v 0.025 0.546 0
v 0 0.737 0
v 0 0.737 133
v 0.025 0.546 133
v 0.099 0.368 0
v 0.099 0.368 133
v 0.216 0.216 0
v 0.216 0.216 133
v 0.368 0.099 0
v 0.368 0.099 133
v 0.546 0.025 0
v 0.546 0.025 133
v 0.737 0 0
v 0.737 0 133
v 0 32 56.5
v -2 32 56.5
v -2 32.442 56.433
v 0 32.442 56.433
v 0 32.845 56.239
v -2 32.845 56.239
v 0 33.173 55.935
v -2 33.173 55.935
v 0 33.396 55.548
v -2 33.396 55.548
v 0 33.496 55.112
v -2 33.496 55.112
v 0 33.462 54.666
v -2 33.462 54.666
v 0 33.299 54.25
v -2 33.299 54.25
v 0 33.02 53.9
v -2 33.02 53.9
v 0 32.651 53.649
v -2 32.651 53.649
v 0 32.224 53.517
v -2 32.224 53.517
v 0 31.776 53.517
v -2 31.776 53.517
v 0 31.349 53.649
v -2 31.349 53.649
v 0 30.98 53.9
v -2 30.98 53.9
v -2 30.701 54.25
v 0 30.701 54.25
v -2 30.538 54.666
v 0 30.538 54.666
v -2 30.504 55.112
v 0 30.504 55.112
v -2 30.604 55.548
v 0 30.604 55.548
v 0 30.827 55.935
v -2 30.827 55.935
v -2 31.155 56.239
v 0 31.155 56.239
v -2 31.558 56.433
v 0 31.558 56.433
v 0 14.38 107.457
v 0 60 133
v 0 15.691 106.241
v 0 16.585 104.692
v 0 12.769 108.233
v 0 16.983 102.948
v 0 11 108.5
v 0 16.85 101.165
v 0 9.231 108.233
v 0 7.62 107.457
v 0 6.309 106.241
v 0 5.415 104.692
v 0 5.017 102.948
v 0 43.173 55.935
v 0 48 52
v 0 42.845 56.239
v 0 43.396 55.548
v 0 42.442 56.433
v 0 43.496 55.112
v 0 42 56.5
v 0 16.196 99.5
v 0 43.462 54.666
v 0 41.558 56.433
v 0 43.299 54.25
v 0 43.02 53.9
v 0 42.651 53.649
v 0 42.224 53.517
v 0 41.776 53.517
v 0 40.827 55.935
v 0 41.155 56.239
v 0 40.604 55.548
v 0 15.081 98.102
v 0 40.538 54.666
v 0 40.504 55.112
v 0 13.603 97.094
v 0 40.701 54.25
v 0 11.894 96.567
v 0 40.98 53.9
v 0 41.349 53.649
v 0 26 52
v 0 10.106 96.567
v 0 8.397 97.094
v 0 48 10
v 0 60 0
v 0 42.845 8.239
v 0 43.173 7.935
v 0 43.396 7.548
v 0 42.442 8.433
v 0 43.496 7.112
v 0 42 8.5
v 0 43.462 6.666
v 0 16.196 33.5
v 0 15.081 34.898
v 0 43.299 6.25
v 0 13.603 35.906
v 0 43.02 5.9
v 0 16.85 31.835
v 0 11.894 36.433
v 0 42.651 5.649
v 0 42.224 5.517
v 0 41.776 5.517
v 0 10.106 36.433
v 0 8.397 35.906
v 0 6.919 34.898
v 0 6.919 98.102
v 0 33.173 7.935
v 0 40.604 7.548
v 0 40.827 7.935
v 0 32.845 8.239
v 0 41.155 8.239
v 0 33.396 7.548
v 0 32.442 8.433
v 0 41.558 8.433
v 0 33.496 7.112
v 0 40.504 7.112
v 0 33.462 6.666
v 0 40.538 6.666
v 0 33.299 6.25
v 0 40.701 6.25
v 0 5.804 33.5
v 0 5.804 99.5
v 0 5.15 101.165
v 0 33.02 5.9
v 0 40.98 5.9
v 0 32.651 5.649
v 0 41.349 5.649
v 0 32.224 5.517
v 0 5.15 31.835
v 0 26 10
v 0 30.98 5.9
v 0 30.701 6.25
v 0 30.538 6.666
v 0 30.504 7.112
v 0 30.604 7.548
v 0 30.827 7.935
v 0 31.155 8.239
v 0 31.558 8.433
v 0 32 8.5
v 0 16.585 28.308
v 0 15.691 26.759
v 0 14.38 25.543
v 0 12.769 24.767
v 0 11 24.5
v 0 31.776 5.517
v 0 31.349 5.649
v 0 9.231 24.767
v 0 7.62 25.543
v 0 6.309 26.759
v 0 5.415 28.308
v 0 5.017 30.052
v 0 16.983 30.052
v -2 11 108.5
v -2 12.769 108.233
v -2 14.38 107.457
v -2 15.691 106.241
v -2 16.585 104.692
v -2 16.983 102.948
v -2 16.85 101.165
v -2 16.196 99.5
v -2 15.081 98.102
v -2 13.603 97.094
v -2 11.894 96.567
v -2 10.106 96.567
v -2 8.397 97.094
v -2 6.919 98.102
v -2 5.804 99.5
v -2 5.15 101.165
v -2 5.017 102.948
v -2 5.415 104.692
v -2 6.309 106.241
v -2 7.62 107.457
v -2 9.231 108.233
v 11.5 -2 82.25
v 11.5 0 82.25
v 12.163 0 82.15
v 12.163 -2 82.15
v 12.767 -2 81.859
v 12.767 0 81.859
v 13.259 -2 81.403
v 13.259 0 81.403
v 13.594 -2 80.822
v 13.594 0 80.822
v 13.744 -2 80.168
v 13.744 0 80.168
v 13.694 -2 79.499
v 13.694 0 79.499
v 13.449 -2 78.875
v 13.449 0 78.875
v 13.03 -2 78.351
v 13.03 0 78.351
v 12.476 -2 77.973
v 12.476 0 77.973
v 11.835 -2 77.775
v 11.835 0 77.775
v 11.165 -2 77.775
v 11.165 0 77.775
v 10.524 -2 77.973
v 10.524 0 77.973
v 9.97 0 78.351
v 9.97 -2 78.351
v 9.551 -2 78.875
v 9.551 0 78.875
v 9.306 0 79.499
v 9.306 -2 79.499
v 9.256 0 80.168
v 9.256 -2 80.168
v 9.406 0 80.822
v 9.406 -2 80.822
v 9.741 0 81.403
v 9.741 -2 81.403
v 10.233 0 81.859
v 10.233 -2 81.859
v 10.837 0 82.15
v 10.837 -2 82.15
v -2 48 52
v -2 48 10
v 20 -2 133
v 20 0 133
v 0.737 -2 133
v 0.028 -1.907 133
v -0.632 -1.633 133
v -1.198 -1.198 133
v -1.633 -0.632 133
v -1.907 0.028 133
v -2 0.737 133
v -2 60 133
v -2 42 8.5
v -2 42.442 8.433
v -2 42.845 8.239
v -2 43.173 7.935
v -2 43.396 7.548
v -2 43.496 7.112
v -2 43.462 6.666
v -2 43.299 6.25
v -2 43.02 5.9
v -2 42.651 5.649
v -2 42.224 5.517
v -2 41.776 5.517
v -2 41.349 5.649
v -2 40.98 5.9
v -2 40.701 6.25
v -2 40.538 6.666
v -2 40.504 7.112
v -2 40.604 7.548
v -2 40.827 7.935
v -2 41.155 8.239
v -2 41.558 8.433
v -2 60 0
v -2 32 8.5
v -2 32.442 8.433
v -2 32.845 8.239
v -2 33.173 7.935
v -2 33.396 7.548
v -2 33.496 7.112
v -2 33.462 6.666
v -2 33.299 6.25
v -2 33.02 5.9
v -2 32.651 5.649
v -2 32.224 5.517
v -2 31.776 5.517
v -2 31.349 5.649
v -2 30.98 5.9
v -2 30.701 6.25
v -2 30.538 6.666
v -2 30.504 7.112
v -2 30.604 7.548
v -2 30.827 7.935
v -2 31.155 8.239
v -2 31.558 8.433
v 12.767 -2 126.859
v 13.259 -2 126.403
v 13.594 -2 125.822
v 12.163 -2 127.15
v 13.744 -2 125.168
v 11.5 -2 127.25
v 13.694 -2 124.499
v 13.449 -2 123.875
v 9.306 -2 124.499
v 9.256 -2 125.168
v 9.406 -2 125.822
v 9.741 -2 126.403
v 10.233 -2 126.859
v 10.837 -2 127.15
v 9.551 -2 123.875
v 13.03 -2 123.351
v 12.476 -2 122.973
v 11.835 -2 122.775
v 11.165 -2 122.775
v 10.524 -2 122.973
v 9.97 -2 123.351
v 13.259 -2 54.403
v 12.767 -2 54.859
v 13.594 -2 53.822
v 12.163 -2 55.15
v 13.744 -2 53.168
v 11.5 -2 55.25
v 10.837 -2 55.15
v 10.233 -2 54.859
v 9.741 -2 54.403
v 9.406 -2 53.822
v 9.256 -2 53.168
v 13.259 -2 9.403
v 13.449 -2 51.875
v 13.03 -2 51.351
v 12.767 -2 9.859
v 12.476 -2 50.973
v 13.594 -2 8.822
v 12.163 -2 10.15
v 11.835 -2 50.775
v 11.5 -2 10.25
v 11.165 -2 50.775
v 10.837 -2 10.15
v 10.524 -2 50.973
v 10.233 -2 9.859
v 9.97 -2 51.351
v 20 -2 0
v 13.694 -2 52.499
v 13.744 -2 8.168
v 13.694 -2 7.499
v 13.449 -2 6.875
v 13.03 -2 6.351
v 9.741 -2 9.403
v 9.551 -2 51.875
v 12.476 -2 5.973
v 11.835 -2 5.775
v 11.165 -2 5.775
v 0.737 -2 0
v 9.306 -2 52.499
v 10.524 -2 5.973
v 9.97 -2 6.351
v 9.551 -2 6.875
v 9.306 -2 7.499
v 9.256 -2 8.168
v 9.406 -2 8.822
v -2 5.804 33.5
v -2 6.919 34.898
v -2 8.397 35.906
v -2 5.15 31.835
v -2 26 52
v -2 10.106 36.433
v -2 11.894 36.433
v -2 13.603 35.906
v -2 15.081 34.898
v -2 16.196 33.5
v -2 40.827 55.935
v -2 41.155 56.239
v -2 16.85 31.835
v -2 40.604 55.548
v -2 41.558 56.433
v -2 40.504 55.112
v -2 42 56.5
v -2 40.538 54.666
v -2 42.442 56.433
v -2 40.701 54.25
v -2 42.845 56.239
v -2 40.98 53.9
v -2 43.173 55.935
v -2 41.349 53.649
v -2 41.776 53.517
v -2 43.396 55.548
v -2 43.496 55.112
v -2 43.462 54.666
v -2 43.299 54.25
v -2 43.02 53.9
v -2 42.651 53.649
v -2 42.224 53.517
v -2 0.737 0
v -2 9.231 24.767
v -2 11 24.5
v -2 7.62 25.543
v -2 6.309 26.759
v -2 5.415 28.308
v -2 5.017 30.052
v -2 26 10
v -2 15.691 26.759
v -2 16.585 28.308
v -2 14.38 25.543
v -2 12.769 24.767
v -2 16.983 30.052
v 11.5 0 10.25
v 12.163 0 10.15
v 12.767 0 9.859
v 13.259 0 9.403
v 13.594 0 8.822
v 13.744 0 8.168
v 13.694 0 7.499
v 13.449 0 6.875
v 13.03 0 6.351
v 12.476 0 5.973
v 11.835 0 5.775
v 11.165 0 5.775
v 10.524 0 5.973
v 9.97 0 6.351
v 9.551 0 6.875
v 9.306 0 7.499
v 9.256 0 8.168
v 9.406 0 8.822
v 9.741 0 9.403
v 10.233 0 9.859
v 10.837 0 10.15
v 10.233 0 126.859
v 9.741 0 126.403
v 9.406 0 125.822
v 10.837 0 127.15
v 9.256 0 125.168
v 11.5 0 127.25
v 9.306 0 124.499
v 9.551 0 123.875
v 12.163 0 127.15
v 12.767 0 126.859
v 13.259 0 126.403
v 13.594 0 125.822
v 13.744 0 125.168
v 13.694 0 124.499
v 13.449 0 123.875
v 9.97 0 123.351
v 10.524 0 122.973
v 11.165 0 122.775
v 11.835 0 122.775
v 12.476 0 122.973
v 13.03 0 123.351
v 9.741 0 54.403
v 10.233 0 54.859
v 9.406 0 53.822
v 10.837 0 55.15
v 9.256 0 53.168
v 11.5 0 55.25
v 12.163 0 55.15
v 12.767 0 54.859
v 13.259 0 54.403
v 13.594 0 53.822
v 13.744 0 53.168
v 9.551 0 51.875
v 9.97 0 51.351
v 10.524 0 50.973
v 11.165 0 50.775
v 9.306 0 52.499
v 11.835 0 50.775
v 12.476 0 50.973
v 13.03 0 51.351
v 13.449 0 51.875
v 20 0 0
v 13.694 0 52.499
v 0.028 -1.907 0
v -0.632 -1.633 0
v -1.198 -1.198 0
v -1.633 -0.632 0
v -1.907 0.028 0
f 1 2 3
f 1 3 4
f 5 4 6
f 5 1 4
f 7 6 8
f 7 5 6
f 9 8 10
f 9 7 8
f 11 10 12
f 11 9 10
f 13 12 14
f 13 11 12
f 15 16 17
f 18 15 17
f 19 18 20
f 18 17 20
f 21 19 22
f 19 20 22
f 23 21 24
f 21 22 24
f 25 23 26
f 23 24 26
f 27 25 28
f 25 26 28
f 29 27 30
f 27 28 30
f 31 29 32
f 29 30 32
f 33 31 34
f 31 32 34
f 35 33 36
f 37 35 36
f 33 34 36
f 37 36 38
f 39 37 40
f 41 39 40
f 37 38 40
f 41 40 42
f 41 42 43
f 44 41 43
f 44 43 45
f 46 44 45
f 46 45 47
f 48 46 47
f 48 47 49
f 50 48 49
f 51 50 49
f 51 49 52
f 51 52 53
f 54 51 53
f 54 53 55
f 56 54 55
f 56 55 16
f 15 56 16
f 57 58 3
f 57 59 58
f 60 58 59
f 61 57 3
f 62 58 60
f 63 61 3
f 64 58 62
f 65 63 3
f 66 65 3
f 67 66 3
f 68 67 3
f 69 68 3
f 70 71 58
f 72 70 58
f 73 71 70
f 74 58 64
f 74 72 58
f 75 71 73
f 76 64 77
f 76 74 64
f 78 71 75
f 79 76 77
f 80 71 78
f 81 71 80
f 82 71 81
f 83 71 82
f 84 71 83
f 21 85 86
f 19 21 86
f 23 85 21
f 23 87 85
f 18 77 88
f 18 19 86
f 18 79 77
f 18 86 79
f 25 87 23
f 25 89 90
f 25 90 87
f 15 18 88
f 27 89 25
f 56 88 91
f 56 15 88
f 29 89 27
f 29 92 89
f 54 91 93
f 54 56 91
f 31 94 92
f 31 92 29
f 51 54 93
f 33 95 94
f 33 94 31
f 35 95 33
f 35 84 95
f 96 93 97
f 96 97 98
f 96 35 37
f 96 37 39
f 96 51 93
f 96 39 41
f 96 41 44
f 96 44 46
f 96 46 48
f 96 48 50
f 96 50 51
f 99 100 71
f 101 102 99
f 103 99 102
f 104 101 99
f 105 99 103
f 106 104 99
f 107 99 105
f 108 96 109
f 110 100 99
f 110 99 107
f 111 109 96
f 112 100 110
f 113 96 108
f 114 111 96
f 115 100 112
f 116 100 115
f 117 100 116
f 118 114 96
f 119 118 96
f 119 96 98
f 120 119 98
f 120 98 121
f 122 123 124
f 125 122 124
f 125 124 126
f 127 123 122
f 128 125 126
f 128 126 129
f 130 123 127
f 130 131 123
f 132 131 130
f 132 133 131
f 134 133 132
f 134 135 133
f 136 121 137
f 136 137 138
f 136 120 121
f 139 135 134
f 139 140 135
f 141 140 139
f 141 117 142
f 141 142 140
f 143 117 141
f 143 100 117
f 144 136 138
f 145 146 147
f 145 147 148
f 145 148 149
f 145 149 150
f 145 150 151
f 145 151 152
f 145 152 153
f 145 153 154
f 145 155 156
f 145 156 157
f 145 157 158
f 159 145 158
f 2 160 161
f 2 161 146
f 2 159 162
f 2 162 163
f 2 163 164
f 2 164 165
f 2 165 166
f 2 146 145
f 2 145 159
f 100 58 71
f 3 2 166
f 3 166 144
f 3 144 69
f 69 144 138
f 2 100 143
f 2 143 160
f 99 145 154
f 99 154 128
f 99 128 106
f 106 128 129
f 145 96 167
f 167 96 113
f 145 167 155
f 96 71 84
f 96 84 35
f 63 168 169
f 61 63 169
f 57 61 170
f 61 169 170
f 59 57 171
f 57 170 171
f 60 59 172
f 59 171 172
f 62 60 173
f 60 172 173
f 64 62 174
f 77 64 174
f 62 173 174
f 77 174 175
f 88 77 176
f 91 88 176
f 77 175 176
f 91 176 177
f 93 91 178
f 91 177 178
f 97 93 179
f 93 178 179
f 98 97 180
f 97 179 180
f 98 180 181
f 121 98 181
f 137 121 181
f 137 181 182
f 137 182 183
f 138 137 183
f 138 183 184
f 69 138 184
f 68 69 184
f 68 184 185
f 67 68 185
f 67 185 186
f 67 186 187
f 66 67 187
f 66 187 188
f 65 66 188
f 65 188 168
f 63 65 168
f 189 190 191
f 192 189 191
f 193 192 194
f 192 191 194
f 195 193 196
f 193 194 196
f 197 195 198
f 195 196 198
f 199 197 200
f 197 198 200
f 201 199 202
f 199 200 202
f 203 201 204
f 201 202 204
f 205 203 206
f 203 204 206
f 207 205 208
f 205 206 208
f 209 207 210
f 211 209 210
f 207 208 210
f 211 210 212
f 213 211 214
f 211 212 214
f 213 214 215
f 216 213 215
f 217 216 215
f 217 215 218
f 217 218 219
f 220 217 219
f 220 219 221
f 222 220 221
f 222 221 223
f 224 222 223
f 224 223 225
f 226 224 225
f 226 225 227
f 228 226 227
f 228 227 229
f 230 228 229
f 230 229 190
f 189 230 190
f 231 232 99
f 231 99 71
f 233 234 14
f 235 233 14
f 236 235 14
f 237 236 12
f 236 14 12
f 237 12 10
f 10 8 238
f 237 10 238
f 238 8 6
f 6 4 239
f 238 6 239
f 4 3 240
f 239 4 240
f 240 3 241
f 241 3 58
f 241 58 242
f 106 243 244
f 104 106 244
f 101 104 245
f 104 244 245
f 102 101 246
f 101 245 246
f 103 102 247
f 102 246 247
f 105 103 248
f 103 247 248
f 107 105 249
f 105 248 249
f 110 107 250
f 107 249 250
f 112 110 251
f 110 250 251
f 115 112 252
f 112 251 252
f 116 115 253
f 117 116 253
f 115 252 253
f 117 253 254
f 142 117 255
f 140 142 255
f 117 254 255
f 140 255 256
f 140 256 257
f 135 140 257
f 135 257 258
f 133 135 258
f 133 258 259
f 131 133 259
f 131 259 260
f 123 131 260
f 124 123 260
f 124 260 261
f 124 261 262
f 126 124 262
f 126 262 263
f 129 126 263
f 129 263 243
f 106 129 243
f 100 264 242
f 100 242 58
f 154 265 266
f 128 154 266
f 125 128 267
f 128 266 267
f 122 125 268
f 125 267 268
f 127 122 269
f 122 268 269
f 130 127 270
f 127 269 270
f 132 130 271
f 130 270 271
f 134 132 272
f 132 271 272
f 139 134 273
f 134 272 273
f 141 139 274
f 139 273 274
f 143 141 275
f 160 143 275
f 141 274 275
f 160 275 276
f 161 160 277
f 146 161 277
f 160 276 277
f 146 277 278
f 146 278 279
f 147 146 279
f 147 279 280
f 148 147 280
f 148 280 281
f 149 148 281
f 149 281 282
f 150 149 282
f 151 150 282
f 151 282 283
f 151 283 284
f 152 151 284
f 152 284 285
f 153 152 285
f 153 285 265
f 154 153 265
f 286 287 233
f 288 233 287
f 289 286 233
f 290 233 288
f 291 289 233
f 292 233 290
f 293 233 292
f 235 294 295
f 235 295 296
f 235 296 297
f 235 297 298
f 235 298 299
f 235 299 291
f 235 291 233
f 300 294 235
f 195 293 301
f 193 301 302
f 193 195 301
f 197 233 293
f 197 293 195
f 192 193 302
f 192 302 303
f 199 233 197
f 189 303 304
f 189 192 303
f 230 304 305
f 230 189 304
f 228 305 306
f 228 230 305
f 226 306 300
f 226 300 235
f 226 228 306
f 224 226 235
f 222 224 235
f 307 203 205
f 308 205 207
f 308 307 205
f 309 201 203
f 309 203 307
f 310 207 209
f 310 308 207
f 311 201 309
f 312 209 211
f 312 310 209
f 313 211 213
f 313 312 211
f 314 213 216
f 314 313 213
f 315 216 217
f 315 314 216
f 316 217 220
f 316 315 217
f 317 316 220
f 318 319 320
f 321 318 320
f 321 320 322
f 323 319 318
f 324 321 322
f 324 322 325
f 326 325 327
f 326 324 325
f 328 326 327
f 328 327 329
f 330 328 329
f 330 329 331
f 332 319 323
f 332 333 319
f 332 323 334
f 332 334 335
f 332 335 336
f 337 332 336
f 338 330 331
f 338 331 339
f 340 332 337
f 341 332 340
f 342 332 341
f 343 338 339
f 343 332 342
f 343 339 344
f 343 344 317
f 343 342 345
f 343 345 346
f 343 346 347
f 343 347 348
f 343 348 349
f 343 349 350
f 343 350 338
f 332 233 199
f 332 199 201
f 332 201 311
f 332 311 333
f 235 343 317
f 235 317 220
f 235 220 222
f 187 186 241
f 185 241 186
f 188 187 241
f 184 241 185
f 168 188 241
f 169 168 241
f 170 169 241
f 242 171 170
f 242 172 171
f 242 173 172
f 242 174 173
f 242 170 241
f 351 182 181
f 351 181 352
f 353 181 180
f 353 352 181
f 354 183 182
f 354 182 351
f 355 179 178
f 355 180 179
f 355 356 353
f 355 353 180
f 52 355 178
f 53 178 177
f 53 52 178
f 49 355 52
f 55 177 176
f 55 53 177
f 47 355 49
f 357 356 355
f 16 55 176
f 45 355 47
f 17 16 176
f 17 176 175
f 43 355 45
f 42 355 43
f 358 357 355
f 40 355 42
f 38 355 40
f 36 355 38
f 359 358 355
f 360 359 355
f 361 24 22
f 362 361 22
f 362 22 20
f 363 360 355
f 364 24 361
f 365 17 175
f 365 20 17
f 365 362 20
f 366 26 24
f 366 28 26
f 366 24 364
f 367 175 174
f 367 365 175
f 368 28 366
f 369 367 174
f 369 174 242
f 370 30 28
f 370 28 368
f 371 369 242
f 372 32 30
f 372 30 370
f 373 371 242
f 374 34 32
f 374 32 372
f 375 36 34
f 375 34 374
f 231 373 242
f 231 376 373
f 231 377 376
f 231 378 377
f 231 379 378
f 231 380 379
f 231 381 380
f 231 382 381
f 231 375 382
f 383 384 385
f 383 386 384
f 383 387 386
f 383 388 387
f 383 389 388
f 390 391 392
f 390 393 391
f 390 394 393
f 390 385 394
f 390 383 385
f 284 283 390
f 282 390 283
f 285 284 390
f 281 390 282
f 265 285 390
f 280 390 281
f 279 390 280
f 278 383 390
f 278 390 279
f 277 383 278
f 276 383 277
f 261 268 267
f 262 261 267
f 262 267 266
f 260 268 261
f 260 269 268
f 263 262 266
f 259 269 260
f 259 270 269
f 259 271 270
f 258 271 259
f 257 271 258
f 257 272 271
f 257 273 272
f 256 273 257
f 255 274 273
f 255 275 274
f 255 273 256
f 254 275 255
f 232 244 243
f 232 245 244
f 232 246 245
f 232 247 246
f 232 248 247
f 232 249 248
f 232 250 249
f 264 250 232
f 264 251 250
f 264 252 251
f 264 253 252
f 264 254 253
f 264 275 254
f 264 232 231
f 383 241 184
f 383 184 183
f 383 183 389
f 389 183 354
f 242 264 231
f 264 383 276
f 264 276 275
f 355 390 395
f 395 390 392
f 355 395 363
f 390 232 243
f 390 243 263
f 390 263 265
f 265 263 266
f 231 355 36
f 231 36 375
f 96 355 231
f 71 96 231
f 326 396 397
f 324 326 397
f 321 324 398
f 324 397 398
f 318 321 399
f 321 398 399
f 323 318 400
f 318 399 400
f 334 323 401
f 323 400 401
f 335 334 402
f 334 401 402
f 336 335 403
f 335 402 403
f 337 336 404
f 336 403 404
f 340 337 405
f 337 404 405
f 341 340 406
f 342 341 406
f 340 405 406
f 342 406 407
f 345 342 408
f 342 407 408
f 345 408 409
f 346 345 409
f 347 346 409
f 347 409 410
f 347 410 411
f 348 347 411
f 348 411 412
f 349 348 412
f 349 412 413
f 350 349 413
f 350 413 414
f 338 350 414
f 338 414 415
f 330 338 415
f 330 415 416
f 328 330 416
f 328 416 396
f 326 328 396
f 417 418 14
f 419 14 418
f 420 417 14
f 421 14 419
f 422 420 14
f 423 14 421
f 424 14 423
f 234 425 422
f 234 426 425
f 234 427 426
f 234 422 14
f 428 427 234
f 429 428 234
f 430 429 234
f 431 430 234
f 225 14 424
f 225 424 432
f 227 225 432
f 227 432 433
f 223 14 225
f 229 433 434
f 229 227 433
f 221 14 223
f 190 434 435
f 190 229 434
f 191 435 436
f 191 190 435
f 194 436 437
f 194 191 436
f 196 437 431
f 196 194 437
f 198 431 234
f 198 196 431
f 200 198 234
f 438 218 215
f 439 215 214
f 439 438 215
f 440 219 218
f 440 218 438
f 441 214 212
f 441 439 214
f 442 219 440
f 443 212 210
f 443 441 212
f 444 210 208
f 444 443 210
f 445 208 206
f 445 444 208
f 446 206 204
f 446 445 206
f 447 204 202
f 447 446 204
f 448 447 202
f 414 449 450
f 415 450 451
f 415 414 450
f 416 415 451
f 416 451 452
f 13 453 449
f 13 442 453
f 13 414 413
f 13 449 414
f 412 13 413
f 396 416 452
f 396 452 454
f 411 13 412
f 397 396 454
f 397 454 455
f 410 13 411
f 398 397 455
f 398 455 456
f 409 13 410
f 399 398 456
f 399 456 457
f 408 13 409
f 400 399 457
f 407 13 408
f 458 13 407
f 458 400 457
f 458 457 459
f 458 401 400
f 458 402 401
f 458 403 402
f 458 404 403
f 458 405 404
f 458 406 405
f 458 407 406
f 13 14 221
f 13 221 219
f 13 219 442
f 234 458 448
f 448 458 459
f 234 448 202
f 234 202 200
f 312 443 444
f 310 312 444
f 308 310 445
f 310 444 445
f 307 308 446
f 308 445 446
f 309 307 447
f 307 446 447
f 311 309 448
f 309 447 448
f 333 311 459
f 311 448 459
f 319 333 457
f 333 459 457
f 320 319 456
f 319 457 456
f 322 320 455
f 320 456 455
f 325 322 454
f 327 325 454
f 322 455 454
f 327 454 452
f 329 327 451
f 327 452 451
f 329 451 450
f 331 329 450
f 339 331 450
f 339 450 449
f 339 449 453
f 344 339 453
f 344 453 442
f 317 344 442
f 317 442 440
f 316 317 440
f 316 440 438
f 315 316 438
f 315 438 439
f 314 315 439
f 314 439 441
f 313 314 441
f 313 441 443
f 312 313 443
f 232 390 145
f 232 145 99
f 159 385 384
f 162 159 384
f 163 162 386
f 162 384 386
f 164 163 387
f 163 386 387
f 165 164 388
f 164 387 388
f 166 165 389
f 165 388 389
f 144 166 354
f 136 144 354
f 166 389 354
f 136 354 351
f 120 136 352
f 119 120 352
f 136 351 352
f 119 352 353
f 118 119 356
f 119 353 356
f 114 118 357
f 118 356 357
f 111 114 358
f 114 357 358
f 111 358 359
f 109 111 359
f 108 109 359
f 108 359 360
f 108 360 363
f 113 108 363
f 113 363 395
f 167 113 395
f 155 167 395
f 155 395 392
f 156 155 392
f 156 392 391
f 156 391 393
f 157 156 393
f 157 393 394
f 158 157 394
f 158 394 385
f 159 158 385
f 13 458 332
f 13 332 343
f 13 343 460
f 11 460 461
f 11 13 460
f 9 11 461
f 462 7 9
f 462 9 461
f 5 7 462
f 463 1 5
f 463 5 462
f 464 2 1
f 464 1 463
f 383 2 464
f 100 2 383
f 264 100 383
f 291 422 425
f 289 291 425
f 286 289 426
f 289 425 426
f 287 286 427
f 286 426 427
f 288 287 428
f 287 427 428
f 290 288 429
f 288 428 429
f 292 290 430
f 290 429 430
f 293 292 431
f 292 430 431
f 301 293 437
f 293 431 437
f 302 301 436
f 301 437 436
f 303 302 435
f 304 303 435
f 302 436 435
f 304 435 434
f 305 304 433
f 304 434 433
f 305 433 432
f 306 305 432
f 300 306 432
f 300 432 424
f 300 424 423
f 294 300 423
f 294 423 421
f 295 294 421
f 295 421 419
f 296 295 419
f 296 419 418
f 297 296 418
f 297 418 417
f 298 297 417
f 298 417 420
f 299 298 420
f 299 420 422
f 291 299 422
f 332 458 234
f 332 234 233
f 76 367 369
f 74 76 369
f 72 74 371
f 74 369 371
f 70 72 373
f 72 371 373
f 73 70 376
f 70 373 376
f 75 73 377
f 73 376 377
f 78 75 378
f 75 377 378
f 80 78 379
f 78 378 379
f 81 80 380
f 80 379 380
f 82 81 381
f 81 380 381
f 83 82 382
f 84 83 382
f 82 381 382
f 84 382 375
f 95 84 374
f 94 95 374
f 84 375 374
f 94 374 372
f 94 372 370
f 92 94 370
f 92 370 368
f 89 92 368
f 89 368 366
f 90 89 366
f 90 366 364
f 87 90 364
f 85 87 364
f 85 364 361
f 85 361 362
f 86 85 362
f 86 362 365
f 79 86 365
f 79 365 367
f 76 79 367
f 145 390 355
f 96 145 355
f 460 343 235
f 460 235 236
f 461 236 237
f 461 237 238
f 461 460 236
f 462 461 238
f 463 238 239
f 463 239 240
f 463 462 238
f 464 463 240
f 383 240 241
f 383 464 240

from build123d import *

# Parameters (mm, degrees)
SM_BASE_FLANGE_1_DEPTH = 133
CUT_EXTRUDE_1_REACH    = 149.557
SKETCH_2_R             = 6
SKETCH_2_W             = 42
SKETCH_2_H             = 22
M4X0_7_3_D             = 2.5
M4X0_7_3_DEPTH         = 7.5
M4X0_7_3_CBORE_D       = 3
M4X0_7_3_CBORE_DEPTH   = 6
M4X0_7_3_TIP           = 0.751075774
SKETCH_6_R             = 2.25
CUT_EXTRUDE_2_DEPTH    = 148.271857461


# Sheet-metal steps are written as plain solids
with BuildPart() as part:
    # Sketch 1 → 基材-凸緣1 (new body)
    with BuildSketch(Plane.XY):
        with BuildLine():
            Line((0, 60), (0, 0.7366))
            ThreePointArc((0, 0.7366), (0.215745145, 0.215745145), (0.7366, 0))
            Line((0.7366, 0), (20, 0))
            Line((20, 0), (20, -2))
            Line((20, -2), (0.7366, -2))
            ThreePointArc((0.7366, -2), (-1.198468417, -1.198468417), (-2, 0.7366))
            Line((-2, 0.7366), (-2, 60))
            Line((-2, 60), (0, 60))
        make_face()
    extrude(amount=SM_BASE_FLANGE_1_DEPTH)

    # Sketch 2 → 除料-伸長1 (cut, up to next)
    with BuildSketch(Plane.ZY.offset(2), mode=Mode.PRIVATE) as cut_extrude_1_sk1:
        with Locations((102.5, 11)):
            Circle(SKETCH_2_R)
    cut_extrude_1_tool1 = extrude(cut_extrude_1_sk1.sketch, amount=-CUT_EXTRUDE_1_REACH, mode=Mode.PRIVATE) & part.part
    # Sketch 2 → 除料-伸長1 (cut, up to next)
    with BuildSketch(Plane.ZY.offset(2), mode=Mode.PRIVATE) as cut_extrude_1_sk2:
        with Locations(Location((30.5, 11, 0), (0, 0, 180))):
            Circle(SKETCH_2_R)
    cut_extrude_1_tool2 = extrude(cut_extrude_1_sk2.sketch, amount=-CUT_EXTRUDE_1_REACH, mode=Mode.PRIVATE) & part.part
    # Sketch 2 → 除料-伸長1 (cut, up to next)
    with BuildSketch(Plane.ZY.offset(2), mode=Mode.PRIVATE) as cut_extrude_1_sk3:
        with Locations((31, 37)):
            Rectangle(SKETCH_2_W, SKETCH_2_H)
    cut_extrude_1_tool3 = extrude(cut_extrude_1_sk3.sketch, amount=-CUT_EXTRUDE_1_REACH, mode=Mode.PRIVATE) & part.part
    add(cut_extrude_1_tool1.solids().sort_by_distance((-2, 11, 102.5))[0], mode=Mode.SUBTRACT)
    add(cut_extrude_1_tool2.solids().sort_by_distance((-2, 11, 30.5))[0], mode=Mode.SUBTRACT)
    add(cut_extrude_1_tool3.solids().sort_by_distance((-2, 37, 31))[0], mode=Mode.SUBTRACT)

    # M4x0.7 螺紋孔3
    with Locations(Plane.ZY.offset(2)):
        with Locations((55, 42), (55, 32), (7, 42), (7, 32)):
            CounterBoreHole(M4X0_7_3_D / 2, M4X0_7_3_CBORE_D / 2, M4X0_7_3_CBORE_DEPTH, depth=M4X0_7_3_DEPTH)
            with Locations((0, 0, -(M4X0_7_3_DEPTH + M4X0_7_3_TIP / 2))):  # 118° drill point
                Cone(0, M4X0_7_3_D / 2, M4X0_7_3_TIP, mode=Mode.SUBTRACT)

    # 草圖6 → 除料-伸長2 (cut, through all)
    with BuildSketch(Plane(origin=(0, 0, 0), x_dir=(1, 0, 0), z_dir=(0, 1, 0))):
        with Locations(Location((11.5, -125, 0), (0, 0, 270))):
            Circle(SKETCH_6_R)
        with Locations(Location((11.5, -80, 0), (0, 0, 270))):
            Circle(SKETCH_6_R)
        with Locations(Location((11.5, -8, 0), (0, 0, 270))):
            Circle(SKETCH_6_R)
        with Locations(Location((11.5, -53, 0), (0, 0, 270))):
            Circle(SKETCH_6_R)
    extrude(amount=-CUT_EXTRUDE_2_DEPTH, mode=Mode.SUBTRACT)


solid = part.part
